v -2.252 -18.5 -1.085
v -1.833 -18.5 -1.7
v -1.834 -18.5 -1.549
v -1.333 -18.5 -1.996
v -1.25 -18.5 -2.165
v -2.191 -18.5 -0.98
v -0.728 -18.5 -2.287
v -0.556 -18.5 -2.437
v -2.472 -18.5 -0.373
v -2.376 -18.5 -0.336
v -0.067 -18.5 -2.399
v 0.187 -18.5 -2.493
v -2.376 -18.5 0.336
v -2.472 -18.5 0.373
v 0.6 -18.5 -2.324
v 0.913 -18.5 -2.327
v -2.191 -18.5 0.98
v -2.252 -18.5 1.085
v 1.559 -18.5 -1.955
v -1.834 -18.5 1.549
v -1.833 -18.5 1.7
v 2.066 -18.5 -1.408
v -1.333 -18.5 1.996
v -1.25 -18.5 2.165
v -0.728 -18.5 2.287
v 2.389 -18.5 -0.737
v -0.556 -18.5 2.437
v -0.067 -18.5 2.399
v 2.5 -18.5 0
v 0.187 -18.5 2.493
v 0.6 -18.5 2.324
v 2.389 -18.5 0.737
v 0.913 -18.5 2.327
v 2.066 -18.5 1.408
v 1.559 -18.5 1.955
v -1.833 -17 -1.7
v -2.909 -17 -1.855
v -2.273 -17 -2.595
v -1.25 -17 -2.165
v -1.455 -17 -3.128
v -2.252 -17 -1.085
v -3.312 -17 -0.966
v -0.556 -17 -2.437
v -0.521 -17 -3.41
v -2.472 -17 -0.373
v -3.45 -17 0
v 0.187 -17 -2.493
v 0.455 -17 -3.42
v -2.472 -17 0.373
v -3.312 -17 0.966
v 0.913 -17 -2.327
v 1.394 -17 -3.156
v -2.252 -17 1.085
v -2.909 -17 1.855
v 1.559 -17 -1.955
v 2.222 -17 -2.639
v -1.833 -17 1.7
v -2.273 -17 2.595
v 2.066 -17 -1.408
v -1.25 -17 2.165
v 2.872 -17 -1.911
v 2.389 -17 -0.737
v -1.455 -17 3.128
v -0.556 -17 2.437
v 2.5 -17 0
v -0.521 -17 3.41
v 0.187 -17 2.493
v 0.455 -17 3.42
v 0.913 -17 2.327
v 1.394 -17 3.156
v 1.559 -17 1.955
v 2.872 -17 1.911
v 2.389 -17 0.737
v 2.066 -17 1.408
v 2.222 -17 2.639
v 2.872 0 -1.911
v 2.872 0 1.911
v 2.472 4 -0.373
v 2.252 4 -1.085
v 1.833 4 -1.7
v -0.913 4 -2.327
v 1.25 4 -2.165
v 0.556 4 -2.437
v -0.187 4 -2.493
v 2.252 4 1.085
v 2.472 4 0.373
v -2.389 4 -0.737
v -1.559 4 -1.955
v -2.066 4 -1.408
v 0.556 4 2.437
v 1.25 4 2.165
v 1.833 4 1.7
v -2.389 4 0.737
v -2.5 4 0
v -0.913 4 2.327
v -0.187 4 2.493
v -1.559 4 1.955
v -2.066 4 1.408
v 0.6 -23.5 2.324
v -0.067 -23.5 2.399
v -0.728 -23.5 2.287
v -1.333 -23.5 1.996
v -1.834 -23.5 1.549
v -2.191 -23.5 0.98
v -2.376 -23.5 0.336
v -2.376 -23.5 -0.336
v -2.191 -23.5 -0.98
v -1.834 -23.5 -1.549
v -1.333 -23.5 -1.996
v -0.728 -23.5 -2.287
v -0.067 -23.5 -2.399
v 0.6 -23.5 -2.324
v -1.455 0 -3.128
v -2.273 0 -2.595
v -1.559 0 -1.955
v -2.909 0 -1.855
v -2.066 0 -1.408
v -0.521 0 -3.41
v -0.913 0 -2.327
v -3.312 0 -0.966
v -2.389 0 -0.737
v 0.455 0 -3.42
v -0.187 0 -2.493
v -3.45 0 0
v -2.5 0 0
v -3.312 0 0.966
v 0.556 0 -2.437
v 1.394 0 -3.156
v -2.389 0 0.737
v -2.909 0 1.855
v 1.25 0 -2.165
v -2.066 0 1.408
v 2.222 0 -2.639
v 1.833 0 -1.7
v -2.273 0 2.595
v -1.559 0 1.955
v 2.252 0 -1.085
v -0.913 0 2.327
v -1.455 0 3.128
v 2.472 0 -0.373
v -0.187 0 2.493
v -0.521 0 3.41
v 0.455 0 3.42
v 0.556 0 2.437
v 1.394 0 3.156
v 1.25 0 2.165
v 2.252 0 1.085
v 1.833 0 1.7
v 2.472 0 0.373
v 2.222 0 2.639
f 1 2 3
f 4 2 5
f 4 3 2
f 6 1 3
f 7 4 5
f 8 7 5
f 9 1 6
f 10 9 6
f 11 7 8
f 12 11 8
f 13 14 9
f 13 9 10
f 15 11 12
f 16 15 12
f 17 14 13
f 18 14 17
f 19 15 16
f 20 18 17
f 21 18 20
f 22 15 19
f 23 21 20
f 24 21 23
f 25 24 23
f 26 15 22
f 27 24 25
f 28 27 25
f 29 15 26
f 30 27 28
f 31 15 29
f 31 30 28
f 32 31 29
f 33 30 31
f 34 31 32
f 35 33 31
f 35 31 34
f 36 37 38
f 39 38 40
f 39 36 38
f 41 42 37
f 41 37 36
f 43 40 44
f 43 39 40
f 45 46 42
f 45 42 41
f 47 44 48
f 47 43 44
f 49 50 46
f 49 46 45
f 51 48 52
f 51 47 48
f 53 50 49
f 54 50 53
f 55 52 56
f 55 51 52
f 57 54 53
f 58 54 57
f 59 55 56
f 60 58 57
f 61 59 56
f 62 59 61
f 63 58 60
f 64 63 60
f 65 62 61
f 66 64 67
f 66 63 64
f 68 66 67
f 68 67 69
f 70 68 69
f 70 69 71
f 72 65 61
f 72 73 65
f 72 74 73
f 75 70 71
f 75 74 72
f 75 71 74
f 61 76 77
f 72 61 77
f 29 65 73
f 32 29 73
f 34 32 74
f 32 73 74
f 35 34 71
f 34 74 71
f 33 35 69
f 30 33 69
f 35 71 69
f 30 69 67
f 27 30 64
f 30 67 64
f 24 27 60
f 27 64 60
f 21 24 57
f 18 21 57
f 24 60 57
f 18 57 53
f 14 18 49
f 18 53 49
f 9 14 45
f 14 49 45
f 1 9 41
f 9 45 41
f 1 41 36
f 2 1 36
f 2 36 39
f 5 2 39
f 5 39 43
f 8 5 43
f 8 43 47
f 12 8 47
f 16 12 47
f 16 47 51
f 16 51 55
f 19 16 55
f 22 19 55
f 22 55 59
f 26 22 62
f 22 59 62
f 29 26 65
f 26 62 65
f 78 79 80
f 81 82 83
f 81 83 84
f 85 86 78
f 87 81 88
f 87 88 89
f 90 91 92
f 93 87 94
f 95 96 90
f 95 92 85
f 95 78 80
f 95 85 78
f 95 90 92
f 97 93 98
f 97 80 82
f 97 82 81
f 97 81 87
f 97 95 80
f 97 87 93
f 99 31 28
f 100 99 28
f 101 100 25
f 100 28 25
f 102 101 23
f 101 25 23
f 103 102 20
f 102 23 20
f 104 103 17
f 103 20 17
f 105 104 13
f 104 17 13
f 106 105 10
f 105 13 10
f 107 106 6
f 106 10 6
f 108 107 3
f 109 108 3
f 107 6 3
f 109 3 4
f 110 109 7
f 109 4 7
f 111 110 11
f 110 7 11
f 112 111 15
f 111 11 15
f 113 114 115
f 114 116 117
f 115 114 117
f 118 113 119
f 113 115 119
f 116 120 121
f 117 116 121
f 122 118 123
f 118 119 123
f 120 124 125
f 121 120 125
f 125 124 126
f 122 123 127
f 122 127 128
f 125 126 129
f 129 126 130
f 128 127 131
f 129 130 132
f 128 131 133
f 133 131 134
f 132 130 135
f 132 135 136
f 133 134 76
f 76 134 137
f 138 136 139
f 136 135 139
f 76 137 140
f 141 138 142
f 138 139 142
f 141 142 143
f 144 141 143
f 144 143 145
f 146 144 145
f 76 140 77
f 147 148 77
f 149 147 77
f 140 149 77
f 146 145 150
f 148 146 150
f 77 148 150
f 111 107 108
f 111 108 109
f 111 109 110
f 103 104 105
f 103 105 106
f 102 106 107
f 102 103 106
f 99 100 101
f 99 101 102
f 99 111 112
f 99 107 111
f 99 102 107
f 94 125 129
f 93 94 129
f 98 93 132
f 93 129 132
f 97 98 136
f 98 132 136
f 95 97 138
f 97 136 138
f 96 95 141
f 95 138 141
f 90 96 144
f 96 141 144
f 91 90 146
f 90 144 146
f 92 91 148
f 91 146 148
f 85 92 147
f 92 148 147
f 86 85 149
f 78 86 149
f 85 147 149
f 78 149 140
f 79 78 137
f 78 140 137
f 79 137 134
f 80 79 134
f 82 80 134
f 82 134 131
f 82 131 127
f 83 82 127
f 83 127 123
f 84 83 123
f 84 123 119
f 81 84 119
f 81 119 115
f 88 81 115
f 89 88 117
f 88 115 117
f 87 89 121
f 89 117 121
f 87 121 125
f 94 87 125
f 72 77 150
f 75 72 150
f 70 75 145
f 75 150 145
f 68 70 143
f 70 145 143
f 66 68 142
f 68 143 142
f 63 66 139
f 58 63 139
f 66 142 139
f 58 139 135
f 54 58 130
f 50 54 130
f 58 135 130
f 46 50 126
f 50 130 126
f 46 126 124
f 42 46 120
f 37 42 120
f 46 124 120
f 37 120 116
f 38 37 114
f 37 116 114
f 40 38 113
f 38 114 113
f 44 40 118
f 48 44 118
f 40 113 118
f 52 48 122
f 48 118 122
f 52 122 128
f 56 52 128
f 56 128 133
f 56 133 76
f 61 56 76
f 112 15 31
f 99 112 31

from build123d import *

# Parameters (mm, degrees)
F1_DEPTH = 17
F2_R     = 2.5
F3_DEPTH = 1.5
F4_R     = 2.5
F5_DEPTH = 4
F7_DEPTH = 5


with BuildPart() as f1:
    # F0 (on Front) → F1 (new body)
    with BuildSketch(Plane.XZ):
        with BuildLine():
            Line((2.8721443851, -1.9113572746), (2.8721443851, 1.9113572746))
            ThreePointArc((2.8721443851, 1.9113572746), (-3.45, 0), (2.8721443851, -1.9113572746))
        make_face()
    extrude(amount=F1_DEPTH)

    # F2 (on face) → F3 (join)
    with BuildSketch(Plane.XZ.offset(17)):
        Circle(F2_R)
    extrude(amount=F3_DEPTH)

    # F4 (on face) → F5 (join)
    with BuildSketch(Plane(origin=(0, 0, 0), x_dir=(-1, 0, 0), z_dir=(0, 1, 0))):
        Circle(F4_R)
    extrude(amount=F5_DEPTH)

    # F6 (on face) → F7 (join)
    with BuildSketch(Plane.XZ.offset(18.5)):
        with BuildLine():
            Line((0.6, -2.3237900077), (0.6, 2.3237900077))
            ThreePointArc((0.6, 2.3237900077), (-2.4, 0), (0.6, -2.3237900077))
        make_face()
    extrude(amount=F7_DEPTH)


solid = f1.part
